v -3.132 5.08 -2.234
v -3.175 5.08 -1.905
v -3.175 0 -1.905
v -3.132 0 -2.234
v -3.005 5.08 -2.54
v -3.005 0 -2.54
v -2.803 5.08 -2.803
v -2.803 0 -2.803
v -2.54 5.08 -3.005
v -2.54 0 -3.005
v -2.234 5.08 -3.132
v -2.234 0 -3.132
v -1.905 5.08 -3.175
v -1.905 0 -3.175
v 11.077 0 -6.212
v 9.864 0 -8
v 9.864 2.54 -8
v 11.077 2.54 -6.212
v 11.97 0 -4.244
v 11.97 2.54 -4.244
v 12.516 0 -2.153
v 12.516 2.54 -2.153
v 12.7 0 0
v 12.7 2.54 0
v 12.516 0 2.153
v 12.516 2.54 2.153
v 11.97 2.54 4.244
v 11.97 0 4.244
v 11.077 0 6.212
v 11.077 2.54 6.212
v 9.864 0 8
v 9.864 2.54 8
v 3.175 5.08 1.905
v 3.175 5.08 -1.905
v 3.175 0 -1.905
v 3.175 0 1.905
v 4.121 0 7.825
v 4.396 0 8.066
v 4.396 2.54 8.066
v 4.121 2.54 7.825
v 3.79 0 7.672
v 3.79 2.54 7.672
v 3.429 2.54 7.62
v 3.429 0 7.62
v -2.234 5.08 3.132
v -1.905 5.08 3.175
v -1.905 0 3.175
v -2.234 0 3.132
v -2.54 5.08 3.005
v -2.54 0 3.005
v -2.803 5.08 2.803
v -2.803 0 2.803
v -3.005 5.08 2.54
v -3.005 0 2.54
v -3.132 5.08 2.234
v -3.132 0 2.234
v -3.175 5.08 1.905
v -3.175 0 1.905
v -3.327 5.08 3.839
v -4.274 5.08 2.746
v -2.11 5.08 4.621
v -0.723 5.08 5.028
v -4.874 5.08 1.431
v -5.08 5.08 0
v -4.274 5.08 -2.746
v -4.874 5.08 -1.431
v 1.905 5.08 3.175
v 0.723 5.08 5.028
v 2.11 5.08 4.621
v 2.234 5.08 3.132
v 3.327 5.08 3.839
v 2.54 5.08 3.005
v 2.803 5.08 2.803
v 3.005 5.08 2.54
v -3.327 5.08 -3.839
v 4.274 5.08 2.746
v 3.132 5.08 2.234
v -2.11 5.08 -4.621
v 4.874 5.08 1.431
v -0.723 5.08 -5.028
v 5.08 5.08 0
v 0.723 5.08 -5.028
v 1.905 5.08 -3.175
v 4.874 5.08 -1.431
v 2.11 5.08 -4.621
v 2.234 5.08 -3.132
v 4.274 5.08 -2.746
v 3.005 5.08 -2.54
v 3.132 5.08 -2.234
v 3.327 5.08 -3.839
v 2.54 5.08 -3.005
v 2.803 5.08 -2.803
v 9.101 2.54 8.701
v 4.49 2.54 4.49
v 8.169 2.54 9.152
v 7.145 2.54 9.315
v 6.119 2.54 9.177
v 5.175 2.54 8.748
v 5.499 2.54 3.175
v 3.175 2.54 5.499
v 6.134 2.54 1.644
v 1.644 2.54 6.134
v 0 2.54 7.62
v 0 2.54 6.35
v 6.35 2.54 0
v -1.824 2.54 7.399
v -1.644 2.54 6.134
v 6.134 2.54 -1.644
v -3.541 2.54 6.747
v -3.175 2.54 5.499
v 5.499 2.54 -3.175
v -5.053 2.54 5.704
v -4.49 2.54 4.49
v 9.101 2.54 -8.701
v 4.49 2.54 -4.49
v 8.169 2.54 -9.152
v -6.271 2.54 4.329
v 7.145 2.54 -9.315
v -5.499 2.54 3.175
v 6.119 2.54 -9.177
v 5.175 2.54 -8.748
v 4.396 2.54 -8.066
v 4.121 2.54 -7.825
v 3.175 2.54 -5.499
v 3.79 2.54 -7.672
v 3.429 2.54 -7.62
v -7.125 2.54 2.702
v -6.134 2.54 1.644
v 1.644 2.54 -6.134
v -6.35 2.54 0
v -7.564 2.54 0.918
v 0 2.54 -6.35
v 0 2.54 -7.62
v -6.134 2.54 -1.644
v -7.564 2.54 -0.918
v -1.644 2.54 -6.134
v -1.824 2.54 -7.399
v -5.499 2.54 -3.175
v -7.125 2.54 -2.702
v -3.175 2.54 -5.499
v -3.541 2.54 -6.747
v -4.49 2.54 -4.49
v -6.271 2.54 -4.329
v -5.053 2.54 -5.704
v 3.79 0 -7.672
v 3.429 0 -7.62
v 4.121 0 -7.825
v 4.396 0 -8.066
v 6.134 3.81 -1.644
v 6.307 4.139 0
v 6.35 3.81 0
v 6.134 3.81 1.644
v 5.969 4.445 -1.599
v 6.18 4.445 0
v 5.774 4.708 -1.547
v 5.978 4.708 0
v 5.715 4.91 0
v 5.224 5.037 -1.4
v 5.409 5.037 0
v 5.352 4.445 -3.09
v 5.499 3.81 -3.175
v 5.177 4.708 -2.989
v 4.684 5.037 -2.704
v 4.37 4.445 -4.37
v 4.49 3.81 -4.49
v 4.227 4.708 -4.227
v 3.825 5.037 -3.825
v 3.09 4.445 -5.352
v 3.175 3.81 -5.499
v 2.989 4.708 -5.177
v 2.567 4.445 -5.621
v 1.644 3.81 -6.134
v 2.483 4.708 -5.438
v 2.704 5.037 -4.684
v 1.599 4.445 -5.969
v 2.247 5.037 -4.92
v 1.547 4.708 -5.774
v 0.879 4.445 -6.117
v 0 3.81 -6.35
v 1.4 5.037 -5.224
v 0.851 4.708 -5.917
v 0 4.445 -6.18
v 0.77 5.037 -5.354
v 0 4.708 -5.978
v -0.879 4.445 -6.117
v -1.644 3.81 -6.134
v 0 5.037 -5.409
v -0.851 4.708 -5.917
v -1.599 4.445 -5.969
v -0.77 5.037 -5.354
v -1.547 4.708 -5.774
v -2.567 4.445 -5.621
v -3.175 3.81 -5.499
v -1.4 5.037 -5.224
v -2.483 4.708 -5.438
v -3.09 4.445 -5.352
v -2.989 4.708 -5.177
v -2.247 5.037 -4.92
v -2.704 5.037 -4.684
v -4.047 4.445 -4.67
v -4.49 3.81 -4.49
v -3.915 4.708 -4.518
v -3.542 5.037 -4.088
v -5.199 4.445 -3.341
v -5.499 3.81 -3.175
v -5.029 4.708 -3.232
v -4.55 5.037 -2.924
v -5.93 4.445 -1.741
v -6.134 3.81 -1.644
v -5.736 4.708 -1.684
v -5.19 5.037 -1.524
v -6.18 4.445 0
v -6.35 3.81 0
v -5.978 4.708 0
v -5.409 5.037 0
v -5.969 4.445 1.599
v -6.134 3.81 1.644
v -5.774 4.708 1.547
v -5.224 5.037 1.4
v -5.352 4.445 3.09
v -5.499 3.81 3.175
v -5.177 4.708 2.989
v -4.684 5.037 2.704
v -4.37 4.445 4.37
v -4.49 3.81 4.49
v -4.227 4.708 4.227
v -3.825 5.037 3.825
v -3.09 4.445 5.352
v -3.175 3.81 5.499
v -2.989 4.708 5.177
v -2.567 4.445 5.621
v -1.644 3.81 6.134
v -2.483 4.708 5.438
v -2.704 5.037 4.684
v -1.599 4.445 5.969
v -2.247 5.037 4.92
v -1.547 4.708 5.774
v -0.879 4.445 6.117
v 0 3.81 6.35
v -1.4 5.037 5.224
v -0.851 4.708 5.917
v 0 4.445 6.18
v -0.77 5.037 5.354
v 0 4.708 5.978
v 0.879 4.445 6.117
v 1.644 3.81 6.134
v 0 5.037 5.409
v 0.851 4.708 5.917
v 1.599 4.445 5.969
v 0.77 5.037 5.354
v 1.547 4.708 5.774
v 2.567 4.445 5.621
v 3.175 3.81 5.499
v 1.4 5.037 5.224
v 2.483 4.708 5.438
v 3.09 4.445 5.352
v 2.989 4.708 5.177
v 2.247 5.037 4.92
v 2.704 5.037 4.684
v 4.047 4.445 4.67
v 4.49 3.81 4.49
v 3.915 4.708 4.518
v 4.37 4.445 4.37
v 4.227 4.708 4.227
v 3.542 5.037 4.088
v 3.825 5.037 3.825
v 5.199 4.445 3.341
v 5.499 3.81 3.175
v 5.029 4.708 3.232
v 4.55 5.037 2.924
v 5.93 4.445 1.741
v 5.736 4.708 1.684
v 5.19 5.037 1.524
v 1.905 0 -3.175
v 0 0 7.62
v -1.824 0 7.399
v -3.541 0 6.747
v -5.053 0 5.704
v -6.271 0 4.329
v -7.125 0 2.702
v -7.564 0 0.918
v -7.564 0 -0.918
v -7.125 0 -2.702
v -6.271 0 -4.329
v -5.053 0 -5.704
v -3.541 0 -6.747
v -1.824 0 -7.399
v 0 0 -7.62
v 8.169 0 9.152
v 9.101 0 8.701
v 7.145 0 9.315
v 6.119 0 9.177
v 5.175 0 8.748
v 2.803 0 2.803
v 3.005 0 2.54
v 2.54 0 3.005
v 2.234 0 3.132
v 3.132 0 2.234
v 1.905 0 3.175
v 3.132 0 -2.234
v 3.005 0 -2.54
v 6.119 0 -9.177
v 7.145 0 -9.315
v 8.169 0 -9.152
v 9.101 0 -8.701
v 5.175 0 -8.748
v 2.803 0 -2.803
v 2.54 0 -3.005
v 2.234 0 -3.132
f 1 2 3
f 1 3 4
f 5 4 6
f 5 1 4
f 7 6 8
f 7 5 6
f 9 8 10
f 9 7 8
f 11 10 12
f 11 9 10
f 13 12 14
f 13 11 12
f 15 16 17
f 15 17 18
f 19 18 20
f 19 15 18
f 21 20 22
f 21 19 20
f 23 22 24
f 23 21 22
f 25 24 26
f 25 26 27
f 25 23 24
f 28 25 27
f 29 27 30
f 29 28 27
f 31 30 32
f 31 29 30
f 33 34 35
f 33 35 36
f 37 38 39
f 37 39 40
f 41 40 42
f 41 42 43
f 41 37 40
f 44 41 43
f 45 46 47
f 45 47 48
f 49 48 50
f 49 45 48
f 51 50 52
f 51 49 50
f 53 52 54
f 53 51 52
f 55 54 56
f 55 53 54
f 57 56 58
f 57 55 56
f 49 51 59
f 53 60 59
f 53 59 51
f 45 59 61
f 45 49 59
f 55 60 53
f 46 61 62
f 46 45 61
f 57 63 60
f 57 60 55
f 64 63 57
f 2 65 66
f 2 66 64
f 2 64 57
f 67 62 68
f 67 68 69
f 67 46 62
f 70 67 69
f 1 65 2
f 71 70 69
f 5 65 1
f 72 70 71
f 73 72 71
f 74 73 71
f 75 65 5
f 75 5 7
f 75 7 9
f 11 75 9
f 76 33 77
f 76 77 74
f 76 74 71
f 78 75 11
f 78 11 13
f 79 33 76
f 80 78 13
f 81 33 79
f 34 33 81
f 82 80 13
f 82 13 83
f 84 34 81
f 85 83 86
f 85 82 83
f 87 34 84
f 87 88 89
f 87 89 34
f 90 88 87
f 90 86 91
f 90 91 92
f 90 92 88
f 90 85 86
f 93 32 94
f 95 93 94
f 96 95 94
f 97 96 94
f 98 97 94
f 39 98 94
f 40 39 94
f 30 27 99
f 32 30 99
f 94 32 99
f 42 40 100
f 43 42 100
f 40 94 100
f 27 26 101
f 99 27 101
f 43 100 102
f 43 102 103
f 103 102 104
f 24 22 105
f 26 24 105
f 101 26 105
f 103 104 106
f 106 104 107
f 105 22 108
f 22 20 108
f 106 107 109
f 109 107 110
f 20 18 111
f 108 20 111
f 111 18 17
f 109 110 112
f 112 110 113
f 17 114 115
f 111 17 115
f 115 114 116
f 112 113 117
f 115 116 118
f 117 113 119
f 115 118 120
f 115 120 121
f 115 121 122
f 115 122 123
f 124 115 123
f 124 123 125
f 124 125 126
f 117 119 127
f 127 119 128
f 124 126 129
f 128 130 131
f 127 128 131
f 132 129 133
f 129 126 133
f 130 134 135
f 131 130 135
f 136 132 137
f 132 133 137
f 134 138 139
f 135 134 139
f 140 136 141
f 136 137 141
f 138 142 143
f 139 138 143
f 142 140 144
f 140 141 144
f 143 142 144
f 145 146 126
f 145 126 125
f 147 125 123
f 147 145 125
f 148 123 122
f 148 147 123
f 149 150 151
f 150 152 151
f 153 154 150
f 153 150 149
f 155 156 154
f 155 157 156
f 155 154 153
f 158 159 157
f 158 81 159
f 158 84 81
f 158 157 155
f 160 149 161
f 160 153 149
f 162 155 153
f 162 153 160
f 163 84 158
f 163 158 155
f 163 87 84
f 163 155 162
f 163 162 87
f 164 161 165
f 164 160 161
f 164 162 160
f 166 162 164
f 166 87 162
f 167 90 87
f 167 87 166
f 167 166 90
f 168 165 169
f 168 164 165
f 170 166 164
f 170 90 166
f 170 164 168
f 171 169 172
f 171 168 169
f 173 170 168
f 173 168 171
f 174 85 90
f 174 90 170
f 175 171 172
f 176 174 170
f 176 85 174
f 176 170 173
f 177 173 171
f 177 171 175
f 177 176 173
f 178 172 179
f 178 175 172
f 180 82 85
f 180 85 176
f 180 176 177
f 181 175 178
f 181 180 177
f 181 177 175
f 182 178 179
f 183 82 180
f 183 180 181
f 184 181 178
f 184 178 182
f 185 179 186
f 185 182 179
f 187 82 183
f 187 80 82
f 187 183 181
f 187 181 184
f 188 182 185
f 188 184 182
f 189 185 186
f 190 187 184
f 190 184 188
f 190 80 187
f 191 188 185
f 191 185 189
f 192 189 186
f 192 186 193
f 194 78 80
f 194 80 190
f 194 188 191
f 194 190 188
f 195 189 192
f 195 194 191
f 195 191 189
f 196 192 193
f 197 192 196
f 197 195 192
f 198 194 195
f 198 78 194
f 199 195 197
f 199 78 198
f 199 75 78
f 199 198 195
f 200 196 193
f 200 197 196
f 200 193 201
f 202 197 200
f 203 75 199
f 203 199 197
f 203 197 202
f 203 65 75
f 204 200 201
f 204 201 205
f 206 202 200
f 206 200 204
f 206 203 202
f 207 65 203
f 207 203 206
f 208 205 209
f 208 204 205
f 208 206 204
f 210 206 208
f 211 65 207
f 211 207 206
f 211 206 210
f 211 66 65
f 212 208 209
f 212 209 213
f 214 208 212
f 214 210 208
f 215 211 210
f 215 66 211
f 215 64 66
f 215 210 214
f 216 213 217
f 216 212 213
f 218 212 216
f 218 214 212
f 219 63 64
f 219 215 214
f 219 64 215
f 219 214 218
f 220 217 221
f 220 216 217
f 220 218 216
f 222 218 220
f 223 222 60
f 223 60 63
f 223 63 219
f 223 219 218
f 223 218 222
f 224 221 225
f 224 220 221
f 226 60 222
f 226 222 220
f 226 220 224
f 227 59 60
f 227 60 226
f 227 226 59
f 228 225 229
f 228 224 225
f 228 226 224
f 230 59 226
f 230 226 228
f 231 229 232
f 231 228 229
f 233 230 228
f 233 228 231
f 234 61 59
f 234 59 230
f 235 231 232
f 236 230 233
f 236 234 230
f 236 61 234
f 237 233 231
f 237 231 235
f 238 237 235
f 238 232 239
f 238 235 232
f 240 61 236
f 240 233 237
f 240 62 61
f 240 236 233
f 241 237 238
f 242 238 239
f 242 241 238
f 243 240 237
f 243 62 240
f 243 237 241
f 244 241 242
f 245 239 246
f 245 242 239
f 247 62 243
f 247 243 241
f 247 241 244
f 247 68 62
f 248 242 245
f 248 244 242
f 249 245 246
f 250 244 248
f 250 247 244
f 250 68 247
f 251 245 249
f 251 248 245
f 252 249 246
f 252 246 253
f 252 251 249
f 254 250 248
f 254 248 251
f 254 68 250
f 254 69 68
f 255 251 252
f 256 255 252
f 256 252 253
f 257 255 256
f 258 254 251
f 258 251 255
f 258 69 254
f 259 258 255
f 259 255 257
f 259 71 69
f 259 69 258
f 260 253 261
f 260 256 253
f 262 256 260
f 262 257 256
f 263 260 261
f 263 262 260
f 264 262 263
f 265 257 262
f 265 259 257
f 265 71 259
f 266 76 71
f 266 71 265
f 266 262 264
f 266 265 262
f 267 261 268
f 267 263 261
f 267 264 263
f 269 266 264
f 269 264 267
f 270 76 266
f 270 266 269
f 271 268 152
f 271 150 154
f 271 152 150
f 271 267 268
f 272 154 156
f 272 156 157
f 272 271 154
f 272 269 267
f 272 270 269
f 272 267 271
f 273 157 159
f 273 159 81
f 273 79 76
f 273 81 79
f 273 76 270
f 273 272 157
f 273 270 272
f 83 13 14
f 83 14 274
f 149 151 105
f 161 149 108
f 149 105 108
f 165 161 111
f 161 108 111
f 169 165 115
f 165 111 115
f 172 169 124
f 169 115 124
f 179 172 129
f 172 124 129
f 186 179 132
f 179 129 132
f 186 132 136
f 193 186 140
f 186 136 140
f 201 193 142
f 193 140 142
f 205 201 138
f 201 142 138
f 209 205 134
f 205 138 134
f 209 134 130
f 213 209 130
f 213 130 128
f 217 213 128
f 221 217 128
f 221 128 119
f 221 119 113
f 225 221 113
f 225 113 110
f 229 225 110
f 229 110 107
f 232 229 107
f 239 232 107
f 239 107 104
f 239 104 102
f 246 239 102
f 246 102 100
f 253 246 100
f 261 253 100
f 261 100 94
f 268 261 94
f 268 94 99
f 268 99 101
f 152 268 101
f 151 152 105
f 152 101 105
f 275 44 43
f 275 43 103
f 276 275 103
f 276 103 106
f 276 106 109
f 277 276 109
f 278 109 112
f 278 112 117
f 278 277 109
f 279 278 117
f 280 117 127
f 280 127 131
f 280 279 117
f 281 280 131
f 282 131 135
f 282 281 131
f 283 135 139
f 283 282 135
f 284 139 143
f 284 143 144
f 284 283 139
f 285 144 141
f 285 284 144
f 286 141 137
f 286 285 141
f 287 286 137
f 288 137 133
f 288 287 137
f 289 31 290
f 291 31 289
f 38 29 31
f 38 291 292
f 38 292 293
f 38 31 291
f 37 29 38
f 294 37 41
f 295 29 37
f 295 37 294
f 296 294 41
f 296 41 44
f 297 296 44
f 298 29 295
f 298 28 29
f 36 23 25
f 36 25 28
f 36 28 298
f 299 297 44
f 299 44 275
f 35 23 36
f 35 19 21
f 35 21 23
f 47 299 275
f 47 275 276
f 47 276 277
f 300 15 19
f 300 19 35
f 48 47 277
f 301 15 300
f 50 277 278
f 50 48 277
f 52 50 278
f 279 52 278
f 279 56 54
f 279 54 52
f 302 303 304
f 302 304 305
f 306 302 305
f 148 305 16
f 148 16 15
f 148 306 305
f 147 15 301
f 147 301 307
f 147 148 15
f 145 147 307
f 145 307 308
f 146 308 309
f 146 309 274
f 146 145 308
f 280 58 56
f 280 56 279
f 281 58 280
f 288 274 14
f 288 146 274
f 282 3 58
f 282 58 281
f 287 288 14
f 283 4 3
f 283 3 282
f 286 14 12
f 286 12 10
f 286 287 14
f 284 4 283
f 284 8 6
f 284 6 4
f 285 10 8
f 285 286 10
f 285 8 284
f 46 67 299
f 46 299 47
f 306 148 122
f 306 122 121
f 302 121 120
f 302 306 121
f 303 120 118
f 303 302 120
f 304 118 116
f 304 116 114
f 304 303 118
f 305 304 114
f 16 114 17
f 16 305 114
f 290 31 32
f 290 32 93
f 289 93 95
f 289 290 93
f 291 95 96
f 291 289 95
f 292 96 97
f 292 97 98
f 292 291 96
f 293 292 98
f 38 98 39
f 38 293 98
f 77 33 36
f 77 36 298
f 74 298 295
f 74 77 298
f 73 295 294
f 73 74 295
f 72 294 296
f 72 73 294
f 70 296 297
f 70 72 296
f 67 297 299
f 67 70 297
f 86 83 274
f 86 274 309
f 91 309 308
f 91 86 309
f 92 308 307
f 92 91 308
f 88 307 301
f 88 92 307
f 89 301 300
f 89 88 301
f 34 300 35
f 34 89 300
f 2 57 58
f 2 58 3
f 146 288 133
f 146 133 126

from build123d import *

# Parameters (mm, degrees)
SKETCH1_R           = 6.35
BOSS_EXTRUDE1_DEPTH = 5.08
BOSS_EXTRUDE2_DEPTH = 2.54
CUT_EXTRUDE1_DEPTH  = 6.08
FILLET1_R           = 1.27


with BuildPart() as part:
    # Sketch1 → Boss-Extrude1 (new body)
    with BuildSketch(Plane(origin=(0, 0, 0), x_dir=(1, 0, 0), z_dir=(0, 1, 0))):
        Circle(SKETCH1_R)
    extrude(amount=BOSS_EXTRUDE1_DEPTH)

    # Sketch3 → Boss-Extrude2 (add)
    with BuildSketch(Plane(origin=(0, 0, 0), x_dir=(1, 0, 0), z_dir=(0, 1, 0))):
        with BuildLine():
            Line((0, 7.62), (3.429, 7.62))
            ThreePointArc((3.429, 7.62), (3.961310007, 7.736940567), (4.395590669, 8.066226682))
            ThreePointArc((4.395590669, 8.066226682), (7.145413446, 9.315396919), (9.863950751, 7.99952971))
            ThreePointArc((9.863950751, 7.99952971), (12.7, 0), (9.863950751, -7.99952971))
            ThreePointArc((9.863950751, -7.99952971), (7.145413446, -9.315396919), (4.395590669, -8.066226682))
            ThreePointArc((4.395590669, -8.066226682), (3.961310007, -7.736940567), (3.429, -7.62))
            Line((3.429, -7.62), (0, -7.62))
            ThreePointArc((0, -7.62), (-7.62, 0), (0, 7.62))
        make_face()
    extrude(amount=BOSS_EXTRUDE2_DEPTH)

    # Sketch4 → Cut-Extrude1 (cut, through all)
    with BuildSketch(Plane(origin=(0, 5.08, 0), x_dir=(1, 0, 0), z_dir=(0, 1, 0))):
        with BuildLine():
            Line((-1.905, 3.175), (1.905, 3.175))
            ThreePointArc((1.905, 3.175), (2.803025612, 2.803025612), (3.175, 1.905))
            Line((3.175, 1.905), (3.175, -1.905))
            ThreePointArc((3.175, -1.905), (2.803025612, -2.803025612), (1.905, -3.175))
            Line((1.905, -3.175), (-1.905, -3.175))
            ThreePointArc((-1.905, -3.175), (-2.803025612, -2.803025612), (-3.175, -1.905))
            Line((-3.175, -1.905), (-3.175, 1.905))
            ThreePointArc((-3.175, 1.905), (-2.803025612, 2.803025612), (-1.905, 3.175))
        make_face()
    extrude(amount=-CUT_EXTRUDE1_DEPTH, mode=Mode.SUBTRACT)

    # Fillet1
    fillet1_edges = [part.edges().sort_by_distance(p)[0] for p in [
        (-6.35, 5.08, 0),
    ]]
    fillet(fillet1_edges, radius=FILLET1_R)


solid = part.part
